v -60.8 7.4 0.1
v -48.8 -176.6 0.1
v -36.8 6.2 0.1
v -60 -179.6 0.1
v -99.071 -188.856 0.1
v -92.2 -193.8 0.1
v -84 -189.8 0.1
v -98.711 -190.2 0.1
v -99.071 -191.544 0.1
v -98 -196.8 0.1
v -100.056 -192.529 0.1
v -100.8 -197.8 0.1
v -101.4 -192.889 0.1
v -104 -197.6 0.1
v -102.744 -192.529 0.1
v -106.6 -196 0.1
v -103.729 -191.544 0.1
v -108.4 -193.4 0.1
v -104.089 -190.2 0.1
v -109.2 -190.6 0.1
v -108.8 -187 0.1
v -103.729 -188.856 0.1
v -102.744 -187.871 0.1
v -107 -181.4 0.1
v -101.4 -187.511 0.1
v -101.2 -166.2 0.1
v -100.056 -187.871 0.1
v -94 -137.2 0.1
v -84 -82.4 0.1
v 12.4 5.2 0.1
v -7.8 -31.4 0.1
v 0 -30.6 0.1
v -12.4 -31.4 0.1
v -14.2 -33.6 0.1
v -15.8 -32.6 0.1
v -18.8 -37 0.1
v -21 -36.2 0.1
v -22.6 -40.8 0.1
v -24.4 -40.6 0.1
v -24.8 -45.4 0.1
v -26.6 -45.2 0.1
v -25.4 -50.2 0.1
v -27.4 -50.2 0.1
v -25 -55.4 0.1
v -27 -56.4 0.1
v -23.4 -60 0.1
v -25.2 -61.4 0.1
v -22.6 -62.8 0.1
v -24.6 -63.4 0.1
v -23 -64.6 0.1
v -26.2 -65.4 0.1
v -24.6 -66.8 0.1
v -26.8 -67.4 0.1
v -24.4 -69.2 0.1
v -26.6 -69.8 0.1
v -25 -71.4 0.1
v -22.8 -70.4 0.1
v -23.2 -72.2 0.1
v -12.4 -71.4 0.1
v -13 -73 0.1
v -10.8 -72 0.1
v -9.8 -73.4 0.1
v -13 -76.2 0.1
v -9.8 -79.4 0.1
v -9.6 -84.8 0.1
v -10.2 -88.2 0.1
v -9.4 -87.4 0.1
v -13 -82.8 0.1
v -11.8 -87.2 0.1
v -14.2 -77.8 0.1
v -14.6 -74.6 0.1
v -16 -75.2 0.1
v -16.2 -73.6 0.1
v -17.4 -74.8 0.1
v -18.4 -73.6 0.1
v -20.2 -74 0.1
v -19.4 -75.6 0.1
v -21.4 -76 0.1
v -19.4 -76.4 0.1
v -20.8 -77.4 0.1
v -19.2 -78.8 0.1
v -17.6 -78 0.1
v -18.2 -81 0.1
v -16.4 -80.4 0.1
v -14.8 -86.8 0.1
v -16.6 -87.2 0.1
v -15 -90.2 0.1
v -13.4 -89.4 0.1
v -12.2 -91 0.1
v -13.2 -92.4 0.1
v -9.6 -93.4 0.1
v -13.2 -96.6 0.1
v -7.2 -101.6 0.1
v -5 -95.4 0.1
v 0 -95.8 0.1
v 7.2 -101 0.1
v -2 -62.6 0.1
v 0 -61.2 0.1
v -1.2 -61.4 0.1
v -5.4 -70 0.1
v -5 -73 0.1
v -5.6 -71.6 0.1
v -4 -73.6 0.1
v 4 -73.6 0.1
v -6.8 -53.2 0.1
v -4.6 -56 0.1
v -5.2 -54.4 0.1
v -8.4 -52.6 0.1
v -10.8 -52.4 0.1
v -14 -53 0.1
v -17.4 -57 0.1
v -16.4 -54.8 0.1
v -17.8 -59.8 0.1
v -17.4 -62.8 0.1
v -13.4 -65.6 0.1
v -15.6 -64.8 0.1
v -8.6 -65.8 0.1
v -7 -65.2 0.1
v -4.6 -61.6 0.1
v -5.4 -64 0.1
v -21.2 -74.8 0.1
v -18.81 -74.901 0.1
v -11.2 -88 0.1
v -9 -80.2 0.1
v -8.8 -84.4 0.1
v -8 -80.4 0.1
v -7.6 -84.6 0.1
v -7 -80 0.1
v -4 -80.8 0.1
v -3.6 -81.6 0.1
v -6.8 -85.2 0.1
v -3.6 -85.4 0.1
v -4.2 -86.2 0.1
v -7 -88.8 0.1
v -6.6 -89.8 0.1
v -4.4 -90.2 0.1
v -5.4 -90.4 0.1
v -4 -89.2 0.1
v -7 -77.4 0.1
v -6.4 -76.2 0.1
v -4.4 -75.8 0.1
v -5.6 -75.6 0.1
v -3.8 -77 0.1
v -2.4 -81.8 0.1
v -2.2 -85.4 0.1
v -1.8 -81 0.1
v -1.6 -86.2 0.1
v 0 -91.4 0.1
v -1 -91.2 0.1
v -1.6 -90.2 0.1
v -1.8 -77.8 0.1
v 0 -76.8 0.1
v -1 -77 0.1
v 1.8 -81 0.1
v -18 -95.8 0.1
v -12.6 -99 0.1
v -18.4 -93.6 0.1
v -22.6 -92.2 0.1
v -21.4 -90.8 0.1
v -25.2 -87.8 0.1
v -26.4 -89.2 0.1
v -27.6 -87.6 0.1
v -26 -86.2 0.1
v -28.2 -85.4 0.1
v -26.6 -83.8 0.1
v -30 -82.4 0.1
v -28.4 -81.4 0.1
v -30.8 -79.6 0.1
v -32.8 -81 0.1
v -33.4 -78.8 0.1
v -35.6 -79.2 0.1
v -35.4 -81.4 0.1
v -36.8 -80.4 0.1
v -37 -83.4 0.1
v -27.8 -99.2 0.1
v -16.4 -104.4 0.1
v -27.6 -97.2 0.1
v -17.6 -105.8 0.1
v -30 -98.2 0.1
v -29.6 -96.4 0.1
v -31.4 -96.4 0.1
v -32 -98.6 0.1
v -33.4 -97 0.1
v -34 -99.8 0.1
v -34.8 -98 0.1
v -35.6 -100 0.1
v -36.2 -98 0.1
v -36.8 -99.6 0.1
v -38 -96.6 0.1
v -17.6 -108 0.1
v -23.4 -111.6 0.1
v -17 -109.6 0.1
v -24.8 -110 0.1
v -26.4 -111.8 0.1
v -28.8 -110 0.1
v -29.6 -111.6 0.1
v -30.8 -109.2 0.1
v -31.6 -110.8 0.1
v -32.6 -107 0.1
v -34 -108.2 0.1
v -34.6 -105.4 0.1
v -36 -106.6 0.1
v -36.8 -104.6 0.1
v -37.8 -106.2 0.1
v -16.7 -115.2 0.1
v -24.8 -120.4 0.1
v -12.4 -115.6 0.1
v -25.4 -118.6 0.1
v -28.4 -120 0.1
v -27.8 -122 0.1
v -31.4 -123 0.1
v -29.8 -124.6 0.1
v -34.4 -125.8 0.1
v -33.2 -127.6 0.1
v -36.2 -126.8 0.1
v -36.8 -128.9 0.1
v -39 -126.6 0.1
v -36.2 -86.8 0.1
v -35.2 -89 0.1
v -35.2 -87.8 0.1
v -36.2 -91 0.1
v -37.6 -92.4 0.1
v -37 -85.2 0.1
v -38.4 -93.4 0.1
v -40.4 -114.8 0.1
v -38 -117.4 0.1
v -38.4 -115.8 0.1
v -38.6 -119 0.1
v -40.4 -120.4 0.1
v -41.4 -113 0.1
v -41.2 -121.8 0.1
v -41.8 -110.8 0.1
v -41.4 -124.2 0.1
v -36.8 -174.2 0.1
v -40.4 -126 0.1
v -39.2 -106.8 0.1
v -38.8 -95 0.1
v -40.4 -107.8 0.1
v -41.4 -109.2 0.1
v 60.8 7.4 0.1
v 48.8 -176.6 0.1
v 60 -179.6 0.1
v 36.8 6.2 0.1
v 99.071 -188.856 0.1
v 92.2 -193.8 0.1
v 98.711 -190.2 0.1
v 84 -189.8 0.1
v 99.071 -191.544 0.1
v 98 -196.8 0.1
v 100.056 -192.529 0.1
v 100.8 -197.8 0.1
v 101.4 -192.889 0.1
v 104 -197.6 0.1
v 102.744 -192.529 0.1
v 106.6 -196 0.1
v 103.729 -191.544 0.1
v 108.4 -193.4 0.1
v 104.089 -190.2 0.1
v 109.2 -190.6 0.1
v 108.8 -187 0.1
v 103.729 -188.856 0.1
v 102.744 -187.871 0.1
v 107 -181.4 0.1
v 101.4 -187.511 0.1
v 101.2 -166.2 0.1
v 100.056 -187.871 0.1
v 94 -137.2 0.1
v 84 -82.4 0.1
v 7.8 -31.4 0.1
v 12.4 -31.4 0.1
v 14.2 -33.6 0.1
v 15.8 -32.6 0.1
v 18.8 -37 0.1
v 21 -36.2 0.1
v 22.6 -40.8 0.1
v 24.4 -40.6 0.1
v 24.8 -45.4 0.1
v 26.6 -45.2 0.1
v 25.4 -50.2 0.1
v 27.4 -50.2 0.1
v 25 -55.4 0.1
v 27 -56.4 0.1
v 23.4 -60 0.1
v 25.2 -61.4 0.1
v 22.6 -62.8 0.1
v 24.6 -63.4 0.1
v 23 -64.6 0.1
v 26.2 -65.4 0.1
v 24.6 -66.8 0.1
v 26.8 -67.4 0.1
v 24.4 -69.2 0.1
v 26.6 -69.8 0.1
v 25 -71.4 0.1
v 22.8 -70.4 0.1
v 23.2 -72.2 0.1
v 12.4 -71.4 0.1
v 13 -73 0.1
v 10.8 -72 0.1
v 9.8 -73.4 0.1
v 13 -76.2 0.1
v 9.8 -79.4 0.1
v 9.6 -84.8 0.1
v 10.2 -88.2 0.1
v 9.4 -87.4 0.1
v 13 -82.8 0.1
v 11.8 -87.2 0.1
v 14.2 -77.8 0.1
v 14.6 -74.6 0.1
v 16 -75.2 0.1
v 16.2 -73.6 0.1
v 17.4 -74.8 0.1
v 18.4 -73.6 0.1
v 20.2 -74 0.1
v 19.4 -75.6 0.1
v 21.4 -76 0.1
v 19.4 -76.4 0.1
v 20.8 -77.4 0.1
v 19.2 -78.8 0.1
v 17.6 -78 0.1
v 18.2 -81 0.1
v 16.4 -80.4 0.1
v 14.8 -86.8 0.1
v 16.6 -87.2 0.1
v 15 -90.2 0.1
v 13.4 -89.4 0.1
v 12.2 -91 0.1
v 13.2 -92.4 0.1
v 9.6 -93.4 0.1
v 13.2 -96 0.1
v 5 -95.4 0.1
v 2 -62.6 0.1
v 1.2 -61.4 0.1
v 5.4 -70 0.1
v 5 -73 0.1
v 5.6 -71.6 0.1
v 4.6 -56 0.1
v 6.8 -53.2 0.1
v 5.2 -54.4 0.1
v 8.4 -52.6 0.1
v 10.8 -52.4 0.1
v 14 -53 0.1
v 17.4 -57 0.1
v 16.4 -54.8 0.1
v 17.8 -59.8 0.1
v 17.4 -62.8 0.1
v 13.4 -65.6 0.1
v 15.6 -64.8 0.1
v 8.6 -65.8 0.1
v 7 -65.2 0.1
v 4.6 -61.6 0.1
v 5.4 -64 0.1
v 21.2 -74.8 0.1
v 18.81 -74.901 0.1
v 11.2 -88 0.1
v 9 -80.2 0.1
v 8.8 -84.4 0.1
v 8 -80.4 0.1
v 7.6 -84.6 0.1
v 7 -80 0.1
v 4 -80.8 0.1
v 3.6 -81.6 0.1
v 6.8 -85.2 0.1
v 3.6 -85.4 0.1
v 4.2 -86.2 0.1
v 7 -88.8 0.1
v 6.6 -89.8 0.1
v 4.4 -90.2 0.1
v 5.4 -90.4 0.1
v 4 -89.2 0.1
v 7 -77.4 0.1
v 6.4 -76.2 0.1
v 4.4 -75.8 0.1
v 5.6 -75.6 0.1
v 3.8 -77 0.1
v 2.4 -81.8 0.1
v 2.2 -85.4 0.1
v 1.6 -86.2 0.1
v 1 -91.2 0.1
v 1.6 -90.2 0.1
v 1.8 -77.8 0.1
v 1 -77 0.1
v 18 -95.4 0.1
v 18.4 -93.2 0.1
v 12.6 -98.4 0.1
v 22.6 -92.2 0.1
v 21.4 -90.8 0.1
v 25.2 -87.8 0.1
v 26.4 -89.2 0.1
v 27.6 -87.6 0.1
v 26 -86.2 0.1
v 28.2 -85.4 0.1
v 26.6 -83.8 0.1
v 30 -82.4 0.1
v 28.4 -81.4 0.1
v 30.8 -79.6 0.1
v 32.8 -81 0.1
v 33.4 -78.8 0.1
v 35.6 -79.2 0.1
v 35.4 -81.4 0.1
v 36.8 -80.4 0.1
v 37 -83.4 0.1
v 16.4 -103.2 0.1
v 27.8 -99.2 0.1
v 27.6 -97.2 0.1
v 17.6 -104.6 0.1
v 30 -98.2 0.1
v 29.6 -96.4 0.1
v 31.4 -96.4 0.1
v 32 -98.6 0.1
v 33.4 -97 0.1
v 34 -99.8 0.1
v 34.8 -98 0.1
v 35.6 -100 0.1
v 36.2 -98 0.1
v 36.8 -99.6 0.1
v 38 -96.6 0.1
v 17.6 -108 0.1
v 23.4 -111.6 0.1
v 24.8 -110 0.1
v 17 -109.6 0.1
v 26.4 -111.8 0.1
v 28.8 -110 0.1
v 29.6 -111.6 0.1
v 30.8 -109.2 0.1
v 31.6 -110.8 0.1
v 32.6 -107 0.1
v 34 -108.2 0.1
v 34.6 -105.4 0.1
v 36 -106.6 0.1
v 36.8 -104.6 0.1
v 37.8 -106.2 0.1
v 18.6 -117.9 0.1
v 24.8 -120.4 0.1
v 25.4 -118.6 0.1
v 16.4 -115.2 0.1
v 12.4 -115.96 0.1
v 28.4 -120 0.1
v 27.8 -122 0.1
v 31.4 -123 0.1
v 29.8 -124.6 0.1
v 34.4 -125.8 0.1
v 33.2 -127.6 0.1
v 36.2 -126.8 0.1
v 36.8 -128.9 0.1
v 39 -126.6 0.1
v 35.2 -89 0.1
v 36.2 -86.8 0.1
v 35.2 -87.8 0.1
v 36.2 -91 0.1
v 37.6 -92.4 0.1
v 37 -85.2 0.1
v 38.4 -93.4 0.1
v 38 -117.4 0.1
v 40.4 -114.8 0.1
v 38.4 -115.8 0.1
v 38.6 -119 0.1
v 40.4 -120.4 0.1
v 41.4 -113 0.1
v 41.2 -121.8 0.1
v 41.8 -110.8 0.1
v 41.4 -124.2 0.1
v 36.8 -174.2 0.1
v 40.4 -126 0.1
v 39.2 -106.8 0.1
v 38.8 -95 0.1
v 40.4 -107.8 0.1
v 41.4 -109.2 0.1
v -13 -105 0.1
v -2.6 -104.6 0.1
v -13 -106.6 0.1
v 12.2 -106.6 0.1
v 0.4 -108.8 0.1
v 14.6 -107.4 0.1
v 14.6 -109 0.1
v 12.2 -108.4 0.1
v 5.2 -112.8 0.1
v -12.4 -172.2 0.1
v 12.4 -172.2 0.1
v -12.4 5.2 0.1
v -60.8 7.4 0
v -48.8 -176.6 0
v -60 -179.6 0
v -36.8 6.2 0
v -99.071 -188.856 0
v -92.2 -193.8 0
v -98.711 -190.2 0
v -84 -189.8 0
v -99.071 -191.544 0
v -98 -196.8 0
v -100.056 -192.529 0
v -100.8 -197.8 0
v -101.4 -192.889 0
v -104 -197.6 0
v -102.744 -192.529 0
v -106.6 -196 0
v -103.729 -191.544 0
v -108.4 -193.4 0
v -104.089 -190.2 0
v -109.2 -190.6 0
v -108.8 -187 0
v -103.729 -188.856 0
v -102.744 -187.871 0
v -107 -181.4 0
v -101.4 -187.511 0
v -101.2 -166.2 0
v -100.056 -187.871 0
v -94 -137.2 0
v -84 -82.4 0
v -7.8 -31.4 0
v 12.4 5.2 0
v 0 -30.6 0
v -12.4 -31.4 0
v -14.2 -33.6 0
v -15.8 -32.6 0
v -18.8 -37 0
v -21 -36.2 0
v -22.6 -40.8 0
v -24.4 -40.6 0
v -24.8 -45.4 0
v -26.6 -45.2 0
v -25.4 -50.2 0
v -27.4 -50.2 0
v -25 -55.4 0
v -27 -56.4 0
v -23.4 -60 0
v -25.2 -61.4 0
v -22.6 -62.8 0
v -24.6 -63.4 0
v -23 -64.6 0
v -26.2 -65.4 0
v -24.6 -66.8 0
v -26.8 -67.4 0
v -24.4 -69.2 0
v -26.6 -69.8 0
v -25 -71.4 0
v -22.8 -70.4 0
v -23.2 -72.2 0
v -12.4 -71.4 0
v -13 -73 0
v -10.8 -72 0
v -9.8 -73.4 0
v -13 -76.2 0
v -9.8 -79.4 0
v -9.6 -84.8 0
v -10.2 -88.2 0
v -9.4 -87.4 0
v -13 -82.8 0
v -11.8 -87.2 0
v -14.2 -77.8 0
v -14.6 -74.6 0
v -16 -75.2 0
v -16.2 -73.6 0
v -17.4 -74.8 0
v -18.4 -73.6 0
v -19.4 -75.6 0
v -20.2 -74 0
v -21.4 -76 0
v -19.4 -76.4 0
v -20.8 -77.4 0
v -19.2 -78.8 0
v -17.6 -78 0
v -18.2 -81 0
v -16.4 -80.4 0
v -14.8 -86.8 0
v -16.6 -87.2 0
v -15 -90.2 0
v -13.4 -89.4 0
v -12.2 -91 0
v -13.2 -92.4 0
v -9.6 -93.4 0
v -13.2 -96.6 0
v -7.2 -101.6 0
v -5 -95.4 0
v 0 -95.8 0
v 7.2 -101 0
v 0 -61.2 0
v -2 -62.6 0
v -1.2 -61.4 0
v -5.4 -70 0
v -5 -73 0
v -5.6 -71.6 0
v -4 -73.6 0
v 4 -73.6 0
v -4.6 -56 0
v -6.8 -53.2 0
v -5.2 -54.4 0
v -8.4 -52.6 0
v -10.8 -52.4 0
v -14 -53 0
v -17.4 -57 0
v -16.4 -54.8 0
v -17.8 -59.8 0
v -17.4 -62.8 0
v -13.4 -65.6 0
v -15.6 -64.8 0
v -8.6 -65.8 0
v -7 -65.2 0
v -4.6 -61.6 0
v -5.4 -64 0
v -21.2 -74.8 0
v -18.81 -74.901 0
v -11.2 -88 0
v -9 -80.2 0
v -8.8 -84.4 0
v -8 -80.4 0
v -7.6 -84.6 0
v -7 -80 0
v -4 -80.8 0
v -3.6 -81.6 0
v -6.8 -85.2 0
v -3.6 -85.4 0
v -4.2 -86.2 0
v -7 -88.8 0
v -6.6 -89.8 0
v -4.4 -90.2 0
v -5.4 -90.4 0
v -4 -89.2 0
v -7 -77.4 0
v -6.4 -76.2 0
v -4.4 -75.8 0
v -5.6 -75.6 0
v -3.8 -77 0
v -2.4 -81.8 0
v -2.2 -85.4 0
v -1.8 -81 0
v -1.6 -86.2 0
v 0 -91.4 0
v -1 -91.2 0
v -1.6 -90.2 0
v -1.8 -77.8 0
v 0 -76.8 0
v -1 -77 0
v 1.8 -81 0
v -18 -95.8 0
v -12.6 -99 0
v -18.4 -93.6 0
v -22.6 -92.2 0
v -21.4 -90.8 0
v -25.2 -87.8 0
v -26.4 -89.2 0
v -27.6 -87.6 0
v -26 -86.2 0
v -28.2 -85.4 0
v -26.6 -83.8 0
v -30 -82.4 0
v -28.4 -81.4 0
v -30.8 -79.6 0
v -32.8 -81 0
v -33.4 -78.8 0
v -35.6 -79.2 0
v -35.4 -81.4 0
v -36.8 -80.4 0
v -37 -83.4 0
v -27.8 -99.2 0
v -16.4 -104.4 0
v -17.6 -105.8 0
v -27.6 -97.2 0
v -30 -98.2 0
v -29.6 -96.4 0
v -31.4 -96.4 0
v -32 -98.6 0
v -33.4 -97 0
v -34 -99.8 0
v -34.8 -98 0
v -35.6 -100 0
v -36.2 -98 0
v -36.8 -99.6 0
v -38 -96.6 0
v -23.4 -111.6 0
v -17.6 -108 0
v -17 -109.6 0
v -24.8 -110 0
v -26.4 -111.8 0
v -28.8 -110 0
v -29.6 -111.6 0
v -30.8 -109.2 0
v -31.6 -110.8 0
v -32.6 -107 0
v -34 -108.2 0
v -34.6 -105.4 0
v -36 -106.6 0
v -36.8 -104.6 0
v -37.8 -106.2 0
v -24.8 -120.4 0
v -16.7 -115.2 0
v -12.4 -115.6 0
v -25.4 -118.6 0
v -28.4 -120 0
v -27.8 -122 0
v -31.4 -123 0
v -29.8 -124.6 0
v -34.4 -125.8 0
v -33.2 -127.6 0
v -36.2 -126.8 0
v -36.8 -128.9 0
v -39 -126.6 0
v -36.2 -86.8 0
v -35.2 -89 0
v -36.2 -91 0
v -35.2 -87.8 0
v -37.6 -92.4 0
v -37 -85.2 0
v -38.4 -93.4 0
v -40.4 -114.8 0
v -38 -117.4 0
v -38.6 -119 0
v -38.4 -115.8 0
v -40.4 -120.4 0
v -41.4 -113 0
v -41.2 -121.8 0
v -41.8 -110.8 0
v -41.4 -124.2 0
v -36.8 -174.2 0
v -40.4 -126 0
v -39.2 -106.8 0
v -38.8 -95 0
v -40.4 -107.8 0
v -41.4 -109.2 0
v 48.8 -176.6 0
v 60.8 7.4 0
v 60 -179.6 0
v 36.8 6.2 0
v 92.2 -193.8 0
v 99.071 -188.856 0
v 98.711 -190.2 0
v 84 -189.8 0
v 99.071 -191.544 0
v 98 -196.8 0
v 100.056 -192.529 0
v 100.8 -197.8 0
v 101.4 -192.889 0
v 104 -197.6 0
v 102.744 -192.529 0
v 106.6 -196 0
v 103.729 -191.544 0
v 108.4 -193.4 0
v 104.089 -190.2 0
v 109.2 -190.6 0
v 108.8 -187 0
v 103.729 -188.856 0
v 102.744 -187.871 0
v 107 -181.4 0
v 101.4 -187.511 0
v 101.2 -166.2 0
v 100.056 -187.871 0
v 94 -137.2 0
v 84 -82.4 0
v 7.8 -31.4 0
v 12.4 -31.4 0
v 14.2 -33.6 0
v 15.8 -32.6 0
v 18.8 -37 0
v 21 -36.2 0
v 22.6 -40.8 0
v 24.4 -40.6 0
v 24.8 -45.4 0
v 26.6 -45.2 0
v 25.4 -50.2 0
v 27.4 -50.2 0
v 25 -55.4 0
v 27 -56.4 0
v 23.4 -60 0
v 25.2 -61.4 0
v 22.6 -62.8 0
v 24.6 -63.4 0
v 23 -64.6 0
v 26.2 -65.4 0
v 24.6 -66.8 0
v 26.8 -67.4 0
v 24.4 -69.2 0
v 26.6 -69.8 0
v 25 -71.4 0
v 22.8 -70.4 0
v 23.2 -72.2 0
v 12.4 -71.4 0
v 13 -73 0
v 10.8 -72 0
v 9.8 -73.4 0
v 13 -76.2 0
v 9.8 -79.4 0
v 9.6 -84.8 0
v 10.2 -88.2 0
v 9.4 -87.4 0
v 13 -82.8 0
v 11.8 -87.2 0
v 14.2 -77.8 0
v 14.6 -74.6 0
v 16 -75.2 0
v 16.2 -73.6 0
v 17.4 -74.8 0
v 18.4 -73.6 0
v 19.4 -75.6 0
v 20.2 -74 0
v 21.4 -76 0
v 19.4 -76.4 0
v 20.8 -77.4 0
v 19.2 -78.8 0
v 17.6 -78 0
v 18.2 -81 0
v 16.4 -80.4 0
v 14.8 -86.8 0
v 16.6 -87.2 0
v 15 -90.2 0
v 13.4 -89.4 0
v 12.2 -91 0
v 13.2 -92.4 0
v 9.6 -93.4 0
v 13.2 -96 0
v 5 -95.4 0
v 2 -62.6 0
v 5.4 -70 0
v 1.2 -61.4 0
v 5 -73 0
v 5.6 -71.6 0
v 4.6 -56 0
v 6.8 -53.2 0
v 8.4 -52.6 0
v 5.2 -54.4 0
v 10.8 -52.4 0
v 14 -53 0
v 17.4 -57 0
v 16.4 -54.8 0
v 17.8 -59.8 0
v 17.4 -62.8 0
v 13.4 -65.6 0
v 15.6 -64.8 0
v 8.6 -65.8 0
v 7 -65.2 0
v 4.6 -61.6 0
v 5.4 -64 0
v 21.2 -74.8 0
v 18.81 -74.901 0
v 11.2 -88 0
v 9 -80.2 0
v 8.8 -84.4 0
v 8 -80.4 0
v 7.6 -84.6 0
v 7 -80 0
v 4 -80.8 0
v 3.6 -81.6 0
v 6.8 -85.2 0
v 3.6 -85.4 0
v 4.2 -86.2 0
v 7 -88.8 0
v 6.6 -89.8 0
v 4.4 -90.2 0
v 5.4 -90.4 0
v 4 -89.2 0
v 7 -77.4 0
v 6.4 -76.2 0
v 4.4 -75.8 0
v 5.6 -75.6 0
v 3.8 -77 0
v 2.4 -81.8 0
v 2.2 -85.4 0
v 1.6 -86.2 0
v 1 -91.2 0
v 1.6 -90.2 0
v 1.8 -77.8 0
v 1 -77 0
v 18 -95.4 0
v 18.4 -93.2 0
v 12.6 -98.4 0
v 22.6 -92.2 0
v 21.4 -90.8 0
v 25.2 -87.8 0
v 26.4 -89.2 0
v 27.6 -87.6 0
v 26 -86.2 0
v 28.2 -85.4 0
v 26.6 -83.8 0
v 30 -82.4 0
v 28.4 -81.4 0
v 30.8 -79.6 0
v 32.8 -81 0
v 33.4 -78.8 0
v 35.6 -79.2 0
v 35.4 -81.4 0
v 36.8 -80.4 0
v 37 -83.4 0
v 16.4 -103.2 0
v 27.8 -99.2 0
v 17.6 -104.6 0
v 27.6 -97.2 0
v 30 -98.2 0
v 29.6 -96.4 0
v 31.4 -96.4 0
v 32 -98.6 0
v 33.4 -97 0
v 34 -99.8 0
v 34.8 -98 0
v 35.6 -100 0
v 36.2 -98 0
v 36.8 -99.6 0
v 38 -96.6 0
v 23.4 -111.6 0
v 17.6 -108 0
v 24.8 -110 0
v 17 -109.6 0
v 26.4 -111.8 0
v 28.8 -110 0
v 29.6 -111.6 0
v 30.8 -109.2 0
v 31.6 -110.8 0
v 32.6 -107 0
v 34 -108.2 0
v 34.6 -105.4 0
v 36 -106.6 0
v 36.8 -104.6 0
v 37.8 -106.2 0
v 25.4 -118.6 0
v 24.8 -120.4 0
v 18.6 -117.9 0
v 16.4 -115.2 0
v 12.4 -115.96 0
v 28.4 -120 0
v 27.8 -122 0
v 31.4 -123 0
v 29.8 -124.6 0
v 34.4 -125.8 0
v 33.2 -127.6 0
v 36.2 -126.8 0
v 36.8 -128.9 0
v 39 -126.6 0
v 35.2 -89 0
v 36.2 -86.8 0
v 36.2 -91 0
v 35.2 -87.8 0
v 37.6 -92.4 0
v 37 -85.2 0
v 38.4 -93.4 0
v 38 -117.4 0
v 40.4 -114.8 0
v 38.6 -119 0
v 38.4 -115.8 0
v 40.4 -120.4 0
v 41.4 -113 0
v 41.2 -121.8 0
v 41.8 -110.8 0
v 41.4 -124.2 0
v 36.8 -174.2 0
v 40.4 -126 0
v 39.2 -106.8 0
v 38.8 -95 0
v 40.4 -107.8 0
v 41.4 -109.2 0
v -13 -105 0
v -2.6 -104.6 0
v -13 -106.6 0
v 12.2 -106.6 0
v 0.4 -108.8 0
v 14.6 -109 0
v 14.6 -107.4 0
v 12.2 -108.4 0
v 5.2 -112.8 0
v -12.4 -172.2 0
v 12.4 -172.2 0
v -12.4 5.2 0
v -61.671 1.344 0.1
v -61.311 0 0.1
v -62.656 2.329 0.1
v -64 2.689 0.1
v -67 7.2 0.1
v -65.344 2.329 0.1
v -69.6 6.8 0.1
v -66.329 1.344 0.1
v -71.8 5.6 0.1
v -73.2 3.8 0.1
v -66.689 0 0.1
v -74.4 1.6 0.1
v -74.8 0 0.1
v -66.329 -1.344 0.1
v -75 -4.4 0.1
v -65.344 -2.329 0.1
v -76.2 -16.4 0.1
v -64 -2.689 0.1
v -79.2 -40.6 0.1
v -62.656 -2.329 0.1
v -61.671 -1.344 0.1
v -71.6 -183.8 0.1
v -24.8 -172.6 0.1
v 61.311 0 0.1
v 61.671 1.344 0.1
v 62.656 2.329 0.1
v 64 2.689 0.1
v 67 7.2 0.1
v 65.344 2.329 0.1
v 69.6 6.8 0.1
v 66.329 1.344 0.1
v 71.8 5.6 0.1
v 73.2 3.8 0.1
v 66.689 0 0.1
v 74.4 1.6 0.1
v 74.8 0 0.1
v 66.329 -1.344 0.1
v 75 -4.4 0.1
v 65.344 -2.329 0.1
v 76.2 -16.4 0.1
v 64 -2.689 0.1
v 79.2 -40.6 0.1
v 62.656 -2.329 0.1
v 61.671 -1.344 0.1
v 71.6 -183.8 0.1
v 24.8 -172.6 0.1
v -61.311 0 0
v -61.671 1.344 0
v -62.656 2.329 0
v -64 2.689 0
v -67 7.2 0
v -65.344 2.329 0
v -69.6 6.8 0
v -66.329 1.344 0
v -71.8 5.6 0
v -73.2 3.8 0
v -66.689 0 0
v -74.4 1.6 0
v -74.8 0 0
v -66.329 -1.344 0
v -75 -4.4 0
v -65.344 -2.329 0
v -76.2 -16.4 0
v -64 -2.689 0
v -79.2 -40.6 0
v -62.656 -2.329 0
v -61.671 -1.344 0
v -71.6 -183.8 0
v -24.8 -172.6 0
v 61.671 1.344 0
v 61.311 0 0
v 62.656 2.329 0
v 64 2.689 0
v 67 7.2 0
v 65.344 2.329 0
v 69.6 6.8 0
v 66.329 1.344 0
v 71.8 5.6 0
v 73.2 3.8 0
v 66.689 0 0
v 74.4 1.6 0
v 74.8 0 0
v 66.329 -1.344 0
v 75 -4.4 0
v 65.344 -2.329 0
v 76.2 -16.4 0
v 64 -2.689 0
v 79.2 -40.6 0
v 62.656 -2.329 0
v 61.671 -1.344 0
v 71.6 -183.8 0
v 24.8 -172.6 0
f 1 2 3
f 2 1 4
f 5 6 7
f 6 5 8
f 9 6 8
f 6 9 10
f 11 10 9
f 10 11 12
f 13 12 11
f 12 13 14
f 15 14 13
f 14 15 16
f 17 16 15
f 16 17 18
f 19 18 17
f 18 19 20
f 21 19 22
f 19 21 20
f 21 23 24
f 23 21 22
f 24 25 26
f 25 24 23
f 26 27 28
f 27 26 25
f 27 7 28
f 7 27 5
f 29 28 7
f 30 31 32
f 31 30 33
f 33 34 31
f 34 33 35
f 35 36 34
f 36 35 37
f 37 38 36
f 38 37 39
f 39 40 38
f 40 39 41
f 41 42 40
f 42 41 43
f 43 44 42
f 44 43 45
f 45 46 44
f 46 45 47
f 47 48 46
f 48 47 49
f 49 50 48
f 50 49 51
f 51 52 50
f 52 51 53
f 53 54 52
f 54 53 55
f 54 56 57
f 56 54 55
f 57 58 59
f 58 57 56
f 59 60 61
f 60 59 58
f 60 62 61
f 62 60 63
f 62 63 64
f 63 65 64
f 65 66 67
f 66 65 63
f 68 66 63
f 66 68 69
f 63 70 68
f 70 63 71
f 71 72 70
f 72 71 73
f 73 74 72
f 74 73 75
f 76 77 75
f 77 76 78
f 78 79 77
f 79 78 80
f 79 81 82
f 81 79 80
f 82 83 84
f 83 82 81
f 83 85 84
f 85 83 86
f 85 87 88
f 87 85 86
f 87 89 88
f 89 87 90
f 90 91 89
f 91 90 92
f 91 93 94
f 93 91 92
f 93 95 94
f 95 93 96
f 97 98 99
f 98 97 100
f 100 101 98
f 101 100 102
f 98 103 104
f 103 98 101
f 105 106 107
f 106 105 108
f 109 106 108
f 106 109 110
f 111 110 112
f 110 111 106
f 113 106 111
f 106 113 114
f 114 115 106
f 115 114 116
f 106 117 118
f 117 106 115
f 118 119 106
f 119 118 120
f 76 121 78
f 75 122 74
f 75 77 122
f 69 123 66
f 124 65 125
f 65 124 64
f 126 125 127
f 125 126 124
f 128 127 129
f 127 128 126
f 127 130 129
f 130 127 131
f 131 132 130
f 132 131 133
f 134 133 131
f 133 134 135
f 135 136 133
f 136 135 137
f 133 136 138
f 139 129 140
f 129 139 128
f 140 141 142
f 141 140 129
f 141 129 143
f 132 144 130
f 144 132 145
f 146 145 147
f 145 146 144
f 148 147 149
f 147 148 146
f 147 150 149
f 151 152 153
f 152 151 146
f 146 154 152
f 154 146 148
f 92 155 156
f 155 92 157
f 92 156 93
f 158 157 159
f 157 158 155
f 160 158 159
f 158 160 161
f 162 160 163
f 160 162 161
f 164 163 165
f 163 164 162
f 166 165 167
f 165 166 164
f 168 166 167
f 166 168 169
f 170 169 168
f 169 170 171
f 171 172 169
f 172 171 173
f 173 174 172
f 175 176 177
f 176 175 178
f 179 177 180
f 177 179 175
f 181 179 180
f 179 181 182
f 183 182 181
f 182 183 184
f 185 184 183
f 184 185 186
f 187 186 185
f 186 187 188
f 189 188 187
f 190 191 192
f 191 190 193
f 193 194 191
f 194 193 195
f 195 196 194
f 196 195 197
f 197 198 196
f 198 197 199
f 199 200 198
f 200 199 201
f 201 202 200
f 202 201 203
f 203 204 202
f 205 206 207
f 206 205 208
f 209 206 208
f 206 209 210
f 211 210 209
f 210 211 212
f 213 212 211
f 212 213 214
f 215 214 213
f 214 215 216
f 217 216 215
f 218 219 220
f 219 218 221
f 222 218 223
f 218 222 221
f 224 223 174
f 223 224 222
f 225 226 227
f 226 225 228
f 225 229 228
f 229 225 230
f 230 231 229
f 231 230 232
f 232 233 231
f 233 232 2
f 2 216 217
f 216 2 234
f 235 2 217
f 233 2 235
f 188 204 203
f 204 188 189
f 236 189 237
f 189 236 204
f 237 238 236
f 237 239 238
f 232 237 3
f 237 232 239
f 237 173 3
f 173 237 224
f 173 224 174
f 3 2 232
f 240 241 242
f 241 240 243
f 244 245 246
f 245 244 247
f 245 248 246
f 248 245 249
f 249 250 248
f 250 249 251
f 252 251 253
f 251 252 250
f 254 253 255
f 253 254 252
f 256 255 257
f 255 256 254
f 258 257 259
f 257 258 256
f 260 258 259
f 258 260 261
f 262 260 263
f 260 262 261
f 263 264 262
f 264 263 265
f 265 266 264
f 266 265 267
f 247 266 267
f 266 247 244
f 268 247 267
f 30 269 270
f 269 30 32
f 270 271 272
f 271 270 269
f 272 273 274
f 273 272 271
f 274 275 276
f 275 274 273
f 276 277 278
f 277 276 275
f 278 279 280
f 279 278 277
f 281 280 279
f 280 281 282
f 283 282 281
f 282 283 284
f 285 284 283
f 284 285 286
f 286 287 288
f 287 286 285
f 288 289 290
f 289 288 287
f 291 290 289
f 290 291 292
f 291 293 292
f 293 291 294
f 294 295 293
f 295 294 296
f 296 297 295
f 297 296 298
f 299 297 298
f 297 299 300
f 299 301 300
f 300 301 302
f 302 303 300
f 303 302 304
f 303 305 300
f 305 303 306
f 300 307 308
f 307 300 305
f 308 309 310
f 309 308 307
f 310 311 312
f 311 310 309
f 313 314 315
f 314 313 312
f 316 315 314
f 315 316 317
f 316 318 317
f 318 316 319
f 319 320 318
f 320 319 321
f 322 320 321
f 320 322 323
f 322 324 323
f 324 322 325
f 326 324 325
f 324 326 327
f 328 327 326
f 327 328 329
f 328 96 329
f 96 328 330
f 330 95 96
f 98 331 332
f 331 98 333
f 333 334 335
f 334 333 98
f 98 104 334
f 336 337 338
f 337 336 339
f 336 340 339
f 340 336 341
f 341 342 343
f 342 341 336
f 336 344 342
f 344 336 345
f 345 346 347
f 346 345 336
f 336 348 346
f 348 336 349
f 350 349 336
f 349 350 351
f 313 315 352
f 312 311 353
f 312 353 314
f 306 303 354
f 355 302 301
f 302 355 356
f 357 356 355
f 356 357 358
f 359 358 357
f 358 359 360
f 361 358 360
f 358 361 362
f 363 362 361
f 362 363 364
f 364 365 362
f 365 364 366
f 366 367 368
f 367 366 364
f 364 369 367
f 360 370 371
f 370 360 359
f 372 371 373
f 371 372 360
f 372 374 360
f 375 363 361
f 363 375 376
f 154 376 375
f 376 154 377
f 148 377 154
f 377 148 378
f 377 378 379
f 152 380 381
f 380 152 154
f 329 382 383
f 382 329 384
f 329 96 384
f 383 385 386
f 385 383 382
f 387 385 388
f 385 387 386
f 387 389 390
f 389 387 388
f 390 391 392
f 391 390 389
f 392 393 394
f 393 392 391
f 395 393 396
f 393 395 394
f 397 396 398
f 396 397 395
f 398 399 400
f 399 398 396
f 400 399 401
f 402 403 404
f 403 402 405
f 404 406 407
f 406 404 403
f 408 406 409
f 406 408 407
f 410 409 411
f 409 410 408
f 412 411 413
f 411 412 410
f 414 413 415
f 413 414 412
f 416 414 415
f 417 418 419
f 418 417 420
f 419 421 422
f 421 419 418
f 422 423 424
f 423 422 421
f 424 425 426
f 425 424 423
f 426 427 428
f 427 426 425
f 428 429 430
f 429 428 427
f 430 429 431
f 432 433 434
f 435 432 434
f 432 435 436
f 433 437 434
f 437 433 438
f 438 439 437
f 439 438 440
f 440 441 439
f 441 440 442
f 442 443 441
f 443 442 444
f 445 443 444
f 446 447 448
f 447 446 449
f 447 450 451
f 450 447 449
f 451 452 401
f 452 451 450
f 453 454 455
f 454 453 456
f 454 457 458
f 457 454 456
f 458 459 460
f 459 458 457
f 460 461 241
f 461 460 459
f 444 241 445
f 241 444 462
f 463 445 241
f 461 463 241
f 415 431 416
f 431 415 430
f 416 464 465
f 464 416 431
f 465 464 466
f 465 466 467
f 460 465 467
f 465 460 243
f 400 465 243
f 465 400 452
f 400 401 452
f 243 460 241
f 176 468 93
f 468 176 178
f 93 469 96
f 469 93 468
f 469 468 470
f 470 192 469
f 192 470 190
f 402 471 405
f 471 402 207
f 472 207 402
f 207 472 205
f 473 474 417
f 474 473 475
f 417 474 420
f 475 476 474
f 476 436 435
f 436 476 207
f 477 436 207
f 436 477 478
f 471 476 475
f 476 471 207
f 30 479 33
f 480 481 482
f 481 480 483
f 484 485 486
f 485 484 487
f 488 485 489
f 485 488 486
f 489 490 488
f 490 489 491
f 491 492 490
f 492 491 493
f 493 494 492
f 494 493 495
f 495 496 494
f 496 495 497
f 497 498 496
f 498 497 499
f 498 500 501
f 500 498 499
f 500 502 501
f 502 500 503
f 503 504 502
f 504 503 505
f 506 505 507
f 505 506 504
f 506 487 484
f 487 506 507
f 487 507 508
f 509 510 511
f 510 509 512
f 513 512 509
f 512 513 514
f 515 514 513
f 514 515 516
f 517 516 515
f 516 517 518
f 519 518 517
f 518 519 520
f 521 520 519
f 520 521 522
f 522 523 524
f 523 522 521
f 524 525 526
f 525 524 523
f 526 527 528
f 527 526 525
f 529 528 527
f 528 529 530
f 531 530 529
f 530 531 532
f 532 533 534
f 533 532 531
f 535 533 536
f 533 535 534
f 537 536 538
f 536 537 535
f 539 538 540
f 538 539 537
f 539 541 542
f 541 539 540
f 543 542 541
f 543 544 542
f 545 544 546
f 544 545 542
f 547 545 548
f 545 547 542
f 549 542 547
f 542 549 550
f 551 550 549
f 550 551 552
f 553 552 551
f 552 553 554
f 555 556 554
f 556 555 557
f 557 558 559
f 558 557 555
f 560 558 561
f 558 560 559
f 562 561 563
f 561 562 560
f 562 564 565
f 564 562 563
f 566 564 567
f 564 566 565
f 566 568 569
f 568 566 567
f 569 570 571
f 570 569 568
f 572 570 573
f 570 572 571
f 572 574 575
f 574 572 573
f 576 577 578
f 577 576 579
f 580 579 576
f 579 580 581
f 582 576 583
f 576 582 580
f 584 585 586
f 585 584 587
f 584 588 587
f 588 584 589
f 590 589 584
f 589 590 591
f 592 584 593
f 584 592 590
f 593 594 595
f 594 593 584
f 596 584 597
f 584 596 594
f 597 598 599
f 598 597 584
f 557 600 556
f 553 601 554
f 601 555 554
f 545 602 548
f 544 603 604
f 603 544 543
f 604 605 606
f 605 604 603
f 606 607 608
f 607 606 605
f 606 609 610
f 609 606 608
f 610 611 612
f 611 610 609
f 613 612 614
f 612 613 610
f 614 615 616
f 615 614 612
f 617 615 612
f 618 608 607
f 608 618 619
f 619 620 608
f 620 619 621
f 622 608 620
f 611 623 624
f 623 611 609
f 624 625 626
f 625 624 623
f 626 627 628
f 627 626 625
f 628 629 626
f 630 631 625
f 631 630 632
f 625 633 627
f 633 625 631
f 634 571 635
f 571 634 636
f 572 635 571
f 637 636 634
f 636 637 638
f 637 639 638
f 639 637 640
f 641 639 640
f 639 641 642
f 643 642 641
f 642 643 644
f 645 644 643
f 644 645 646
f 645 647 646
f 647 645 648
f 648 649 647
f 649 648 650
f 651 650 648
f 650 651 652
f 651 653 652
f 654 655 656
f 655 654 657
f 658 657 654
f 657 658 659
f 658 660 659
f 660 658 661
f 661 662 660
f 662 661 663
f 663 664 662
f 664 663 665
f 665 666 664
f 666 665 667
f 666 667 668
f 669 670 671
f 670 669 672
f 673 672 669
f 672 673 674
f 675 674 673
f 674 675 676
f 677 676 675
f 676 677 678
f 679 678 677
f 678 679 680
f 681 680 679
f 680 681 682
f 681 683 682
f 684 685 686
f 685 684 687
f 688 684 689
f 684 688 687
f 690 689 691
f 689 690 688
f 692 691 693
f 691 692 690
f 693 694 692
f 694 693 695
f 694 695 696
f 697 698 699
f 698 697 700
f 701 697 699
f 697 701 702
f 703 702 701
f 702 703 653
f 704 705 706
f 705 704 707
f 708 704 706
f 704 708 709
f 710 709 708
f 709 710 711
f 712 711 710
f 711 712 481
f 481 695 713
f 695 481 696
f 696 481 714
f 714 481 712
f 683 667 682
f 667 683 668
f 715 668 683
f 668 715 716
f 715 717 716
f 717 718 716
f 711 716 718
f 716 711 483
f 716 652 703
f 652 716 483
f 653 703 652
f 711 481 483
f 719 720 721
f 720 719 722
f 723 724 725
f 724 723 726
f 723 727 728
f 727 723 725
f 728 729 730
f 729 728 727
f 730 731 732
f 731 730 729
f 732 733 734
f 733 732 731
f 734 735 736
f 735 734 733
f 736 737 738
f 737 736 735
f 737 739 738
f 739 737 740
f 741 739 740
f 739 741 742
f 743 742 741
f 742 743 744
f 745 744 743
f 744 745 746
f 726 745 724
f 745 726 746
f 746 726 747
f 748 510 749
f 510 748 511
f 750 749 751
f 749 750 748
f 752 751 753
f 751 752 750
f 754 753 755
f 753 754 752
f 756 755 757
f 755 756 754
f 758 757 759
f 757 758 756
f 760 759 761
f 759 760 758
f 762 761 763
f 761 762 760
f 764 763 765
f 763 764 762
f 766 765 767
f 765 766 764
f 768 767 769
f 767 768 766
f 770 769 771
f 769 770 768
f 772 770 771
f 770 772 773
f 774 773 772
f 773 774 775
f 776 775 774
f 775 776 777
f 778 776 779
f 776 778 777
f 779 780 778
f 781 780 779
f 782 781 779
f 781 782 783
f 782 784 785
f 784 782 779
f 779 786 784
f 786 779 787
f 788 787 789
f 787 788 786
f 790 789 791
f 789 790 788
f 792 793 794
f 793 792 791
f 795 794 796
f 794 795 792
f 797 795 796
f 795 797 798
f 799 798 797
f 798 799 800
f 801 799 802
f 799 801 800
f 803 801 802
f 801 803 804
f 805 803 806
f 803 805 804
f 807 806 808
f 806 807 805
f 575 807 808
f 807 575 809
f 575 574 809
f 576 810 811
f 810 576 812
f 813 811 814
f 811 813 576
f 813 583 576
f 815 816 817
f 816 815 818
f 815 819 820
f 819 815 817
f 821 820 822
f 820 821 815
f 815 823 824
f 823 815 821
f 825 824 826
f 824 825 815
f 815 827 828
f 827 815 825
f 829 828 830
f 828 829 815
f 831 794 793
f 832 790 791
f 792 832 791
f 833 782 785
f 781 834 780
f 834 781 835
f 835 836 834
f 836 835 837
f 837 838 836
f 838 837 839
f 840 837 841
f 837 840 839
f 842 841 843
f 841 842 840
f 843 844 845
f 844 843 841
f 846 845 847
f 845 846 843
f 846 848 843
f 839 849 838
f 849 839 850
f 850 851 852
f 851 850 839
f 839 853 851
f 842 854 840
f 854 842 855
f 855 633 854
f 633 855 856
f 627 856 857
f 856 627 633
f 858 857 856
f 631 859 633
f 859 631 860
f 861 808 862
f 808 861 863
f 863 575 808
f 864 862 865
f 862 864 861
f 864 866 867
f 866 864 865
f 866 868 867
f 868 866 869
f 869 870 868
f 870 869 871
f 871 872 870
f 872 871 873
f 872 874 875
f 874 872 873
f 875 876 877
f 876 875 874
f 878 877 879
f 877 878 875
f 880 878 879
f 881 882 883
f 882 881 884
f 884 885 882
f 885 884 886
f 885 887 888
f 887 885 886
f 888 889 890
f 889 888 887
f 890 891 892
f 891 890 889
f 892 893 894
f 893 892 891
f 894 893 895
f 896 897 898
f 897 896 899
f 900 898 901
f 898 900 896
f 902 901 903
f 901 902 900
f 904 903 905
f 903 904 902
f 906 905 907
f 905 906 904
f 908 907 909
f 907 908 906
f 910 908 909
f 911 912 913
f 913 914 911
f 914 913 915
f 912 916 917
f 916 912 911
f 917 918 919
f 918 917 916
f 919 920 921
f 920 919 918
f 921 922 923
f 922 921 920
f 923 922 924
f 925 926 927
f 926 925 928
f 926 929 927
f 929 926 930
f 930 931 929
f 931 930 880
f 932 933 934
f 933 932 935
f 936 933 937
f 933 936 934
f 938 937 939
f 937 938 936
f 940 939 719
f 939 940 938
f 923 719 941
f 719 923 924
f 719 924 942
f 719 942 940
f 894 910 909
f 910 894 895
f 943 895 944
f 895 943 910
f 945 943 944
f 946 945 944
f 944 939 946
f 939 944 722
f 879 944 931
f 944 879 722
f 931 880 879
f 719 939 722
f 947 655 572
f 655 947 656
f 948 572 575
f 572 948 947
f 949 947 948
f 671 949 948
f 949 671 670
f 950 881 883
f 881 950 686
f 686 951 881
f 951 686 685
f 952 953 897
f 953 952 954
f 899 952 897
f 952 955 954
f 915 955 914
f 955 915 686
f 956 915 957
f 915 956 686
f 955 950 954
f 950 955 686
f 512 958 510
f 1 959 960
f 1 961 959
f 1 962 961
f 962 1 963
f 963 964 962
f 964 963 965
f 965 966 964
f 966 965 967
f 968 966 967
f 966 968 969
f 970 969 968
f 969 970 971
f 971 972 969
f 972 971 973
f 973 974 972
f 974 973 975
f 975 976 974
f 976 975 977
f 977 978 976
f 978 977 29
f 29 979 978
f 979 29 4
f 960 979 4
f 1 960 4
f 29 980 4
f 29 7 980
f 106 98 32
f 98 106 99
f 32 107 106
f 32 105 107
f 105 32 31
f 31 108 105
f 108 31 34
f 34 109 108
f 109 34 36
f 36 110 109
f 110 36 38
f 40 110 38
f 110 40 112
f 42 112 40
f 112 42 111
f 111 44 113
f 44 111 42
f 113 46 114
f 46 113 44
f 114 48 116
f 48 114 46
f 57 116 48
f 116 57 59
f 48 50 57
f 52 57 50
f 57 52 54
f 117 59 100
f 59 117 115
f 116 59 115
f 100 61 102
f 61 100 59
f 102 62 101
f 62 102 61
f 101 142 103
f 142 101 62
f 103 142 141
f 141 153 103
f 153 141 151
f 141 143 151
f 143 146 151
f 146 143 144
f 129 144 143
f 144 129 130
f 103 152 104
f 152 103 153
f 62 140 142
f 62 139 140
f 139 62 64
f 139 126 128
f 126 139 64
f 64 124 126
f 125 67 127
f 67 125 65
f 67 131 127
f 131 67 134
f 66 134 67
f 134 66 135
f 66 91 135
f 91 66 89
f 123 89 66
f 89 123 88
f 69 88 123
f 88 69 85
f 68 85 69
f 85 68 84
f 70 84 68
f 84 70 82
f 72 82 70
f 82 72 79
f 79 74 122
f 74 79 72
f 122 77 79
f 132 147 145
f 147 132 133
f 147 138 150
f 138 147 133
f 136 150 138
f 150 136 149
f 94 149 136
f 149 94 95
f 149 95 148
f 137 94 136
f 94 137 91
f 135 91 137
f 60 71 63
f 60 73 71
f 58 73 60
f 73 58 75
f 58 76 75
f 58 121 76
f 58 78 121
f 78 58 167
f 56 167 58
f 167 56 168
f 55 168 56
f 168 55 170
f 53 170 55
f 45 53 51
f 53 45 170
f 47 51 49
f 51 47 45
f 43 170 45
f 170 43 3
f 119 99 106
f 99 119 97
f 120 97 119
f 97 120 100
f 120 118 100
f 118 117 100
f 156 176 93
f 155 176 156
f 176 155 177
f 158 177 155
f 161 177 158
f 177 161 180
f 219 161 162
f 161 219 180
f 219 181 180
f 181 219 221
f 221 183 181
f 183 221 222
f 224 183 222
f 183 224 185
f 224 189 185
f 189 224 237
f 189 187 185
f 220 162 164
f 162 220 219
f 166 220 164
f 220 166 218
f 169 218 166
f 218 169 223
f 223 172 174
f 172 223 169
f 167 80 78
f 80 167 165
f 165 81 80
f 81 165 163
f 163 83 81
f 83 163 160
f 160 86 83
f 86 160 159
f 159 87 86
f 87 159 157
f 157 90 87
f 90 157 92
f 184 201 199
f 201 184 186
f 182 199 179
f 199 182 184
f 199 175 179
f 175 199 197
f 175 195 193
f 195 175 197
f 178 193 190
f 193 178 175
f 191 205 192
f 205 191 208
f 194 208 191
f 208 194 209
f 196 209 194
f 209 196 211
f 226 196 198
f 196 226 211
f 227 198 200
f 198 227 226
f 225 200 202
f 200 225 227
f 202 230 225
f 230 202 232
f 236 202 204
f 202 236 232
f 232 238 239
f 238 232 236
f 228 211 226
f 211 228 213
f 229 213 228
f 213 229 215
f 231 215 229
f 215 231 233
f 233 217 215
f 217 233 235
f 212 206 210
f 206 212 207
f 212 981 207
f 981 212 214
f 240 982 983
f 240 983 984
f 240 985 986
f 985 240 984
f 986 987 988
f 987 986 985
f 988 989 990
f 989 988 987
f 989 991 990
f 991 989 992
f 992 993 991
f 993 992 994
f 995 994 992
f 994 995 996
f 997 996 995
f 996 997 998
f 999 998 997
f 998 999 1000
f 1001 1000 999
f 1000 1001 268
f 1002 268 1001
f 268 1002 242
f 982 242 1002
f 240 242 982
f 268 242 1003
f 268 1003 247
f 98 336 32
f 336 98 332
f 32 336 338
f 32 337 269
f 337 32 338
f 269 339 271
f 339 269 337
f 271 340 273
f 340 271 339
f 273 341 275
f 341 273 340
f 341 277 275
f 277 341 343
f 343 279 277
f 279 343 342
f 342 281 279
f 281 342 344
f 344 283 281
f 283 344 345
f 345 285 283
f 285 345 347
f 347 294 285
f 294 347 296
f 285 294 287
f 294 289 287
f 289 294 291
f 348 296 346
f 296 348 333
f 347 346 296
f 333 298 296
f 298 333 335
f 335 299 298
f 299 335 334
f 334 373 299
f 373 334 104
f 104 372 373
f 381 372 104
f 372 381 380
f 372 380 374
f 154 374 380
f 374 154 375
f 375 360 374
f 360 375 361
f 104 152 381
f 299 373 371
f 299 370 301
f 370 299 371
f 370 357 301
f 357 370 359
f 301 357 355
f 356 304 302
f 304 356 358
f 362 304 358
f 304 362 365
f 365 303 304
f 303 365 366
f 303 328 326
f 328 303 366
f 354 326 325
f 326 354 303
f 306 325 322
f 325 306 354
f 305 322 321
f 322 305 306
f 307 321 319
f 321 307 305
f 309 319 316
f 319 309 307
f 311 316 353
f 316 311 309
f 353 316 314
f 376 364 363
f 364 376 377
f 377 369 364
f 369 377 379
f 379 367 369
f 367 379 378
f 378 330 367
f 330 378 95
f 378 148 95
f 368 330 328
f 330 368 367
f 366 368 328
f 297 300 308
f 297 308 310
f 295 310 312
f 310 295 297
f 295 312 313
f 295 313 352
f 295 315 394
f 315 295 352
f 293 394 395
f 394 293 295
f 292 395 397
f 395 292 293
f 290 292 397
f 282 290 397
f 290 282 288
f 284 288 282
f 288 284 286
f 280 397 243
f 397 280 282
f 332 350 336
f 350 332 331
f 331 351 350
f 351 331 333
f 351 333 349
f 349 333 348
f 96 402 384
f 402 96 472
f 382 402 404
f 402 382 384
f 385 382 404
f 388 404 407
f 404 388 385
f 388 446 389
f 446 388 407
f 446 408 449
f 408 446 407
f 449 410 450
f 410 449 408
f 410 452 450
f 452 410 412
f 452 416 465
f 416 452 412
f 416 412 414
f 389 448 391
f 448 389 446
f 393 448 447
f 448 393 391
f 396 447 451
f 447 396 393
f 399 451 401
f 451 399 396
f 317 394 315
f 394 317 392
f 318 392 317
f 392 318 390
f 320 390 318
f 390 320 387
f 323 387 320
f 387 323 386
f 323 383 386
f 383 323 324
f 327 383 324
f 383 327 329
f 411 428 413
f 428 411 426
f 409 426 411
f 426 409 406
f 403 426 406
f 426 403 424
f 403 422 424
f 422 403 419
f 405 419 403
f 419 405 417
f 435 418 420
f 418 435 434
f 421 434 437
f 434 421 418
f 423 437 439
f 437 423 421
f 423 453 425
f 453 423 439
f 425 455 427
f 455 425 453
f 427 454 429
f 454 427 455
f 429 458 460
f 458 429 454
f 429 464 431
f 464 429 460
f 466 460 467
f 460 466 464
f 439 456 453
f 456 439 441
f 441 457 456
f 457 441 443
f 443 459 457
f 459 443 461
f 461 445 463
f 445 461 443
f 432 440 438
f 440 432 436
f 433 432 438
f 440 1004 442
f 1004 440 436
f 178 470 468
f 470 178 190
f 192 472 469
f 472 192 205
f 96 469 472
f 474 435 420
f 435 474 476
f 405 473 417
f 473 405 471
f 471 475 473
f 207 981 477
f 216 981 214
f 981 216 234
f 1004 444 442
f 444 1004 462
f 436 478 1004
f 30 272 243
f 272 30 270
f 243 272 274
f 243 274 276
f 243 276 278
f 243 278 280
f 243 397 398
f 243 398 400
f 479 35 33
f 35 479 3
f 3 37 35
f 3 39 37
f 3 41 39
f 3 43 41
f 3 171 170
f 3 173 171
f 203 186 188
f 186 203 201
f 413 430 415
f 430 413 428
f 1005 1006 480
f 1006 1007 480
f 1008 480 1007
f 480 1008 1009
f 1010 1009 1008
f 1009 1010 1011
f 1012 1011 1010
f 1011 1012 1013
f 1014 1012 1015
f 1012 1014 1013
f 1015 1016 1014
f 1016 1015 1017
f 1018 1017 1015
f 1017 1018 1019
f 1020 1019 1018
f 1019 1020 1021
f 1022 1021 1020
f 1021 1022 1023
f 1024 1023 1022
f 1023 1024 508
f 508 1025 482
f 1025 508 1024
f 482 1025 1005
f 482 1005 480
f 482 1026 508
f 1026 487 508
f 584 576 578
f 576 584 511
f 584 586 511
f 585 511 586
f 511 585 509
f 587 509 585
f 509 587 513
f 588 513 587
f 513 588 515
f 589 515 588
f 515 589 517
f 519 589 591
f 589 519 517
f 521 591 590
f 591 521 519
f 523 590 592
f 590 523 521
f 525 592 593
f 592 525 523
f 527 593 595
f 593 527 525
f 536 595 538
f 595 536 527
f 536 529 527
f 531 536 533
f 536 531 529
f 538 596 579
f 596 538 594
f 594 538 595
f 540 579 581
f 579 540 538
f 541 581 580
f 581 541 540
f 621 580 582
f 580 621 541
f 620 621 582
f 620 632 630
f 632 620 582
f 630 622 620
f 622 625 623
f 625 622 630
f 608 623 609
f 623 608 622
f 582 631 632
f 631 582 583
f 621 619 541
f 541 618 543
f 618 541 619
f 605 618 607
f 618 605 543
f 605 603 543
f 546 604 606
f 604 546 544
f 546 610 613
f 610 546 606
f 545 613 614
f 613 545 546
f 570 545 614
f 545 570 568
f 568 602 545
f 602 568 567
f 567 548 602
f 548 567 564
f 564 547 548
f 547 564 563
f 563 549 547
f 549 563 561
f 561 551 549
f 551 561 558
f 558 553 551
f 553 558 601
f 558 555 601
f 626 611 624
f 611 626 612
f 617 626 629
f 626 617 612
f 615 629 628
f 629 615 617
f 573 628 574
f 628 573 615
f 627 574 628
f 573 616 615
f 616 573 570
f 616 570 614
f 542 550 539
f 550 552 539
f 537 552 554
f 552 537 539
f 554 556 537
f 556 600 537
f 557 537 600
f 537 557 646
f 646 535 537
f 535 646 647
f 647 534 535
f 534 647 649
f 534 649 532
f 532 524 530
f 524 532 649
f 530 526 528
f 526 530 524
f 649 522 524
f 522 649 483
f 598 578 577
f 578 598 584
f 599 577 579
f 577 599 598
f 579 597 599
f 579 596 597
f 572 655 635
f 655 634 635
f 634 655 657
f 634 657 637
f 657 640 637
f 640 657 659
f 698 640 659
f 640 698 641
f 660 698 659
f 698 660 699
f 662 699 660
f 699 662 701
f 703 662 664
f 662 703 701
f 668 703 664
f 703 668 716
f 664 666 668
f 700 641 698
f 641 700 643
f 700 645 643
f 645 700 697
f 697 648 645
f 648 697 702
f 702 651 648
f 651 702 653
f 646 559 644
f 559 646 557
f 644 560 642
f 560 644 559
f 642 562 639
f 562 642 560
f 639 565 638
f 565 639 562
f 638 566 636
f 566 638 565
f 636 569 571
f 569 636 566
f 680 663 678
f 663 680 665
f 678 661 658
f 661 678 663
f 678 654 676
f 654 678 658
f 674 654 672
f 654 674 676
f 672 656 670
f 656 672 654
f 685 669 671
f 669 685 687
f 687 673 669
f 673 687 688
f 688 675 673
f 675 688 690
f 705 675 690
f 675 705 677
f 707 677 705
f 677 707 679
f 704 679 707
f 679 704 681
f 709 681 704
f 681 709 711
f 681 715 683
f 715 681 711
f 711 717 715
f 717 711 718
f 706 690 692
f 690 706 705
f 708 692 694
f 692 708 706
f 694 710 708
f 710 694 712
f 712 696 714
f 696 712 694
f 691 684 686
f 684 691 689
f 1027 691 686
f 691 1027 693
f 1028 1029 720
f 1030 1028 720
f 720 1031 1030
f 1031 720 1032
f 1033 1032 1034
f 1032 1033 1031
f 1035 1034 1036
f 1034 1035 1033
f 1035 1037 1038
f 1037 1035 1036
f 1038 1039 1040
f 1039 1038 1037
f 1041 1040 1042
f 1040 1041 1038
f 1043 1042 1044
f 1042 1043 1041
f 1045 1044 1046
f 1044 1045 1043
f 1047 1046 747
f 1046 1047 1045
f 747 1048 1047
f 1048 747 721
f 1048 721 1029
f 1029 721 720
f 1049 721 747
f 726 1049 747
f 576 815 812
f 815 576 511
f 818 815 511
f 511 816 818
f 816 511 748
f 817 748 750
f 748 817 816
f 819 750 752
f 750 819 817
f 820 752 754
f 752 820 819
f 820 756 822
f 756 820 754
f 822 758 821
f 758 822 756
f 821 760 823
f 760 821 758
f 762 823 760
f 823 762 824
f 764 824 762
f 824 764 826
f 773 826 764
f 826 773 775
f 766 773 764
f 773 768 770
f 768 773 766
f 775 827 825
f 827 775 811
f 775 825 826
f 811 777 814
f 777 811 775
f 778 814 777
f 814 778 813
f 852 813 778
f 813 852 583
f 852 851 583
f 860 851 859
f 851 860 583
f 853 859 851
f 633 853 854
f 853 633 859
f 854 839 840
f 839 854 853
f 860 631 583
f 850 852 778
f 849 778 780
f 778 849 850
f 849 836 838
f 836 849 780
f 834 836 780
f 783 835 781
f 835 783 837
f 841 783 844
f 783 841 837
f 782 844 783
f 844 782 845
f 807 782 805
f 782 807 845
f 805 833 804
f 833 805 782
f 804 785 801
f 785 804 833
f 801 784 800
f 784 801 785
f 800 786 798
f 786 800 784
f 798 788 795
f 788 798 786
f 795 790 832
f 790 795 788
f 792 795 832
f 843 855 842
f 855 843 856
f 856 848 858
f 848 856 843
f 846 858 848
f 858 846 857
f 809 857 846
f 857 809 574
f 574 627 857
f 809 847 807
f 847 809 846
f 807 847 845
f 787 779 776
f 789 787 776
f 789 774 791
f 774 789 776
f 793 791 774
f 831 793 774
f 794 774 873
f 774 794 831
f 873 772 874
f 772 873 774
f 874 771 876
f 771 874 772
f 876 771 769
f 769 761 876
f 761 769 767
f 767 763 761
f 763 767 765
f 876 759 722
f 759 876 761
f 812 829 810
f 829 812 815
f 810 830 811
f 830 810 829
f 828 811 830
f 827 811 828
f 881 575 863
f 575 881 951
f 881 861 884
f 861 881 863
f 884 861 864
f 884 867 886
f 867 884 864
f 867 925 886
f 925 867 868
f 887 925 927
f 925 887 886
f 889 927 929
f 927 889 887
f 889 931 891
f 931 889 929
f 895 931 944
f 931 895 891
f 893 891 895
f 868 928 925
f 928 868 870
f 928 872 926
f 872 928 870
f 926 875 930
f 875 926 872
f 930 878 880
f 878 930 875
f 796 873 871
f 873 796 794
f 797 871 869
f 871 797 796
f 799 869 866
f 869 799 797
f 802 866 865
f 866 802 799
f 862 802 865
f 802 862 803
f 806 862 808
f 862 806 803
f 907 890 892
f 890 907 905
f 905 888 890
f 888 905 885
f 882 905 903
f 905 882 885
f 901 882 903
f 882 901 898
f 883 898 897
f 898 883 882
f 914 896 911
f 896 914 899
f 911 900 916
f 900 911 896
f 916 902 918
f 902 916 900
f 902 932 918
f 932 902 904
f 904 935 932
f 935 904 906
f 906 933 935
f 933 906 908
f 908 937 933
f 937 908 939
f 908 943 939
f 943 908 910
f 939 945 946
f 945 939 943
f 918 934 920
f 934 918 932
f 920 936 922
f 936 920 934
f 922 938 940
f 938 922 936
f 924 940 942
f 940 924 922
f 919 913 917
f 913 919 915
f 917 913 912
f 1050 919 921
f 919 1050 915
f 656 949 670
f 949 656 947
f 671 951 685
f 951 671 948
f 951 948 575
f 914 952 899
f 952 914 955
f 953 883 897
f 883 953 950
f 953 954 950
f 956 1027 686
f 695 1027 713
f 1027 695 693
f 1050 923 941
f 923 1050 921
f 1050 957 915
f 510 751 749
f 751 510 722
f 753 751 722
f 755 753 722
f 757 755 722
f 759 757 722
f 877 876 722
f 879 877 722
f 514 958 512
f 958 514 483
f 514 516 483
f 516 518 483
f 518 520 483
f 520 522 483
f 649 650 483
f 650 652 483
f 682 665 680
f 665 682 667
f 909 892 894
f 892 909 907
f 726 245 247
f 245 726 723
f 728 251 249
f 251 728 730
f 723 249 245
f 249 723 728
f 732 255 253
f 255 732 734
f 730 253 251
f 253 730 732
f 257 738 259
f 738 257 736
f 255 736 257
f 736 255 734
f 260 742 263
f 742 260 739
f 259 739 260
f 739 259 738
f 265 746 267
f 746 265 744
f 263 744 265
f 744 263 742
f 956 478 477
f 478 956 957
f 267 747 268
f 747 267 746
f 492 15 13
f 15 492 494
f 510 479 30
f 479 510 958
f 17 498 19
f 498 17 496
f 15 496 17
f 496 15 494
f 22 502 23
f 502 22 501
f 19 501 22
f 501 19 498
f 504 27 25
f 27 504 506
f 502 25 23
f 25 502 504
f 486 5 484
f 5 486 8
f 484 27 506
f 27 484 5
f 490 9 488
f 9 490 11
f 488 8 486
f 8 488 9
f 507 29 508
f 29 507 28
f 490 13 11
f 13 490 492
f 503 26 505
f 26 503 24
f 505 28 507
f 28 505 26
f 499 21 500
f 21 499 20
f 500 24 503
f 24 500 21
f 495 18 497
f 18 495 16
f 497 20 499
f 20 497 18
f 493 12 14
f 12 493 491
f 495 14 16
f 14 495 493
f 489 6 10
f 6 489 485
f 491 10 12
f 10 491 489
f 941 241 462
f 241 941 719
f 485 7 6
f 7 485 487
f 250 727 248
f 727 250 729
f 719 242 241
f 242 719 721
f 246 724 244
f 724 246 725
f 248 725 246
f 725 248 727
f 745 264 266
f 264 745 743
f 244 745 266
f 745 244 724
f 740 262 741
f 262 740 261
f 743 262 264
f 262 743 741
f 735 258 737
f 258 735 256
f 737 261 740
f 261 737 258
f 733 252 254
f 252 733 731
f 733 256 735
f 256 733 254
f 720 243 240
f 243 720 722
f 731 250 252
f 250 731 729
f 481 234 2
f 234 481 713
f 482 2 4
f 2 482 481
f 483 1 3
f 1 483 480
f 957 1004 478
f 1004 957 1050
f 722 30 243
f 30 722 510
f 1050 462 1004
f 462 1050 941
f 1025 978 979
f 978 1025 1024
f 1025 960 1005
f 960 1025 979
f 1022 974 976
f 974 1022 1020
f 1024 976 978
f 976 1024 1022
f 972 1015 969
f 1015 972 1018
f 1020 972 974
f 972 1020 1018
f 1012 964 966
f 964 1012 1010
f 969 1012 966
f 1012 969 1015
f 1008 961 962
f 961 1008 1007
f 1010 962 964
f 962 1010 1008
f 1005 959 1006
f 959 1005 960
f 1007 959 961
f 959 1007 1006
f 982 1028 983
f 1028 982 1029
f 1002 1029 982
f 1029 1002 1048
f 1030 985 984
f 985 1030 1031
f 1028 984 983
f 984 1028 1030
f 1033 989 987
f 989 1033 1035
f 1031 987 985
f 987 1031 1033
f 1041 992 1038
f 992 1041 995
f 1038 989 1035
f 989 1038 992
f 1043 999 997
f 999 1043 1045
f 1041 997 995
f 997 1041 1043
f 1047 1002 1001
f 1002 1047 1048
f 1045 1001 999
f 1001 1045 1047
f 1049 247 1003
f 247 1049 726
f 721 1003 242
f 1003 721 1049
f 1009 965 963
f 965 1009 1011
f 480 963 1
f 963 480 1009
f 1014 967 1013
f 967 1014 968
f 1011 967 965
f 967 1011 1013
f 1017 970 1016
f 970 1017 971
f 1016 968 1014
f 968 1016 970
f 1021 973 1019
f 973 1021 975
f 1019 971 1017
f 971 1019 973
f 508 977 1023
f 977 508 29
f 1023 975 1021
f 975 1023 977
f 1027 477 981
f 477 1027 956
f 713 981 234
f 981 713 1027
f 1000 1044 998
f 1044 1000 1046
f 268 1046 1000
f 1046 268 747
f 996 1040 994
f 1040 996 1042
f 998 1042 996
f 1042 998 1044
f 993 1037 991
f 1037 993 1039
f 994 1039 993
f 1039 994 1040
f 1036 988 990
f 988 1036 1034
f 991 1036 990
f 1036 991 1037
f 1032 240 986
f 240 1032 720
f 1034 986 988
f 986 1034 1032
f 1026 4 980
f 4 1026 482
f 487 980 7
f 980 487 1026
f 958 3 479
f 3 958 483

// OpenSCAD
use <../lib.scad>
use <s/u9499s01.scad>
use <s/u9499s02.scad>
use <s/u9499s03.scad>
use <s/u9499s04.scad>
function ldraw_lib__u9499p01() = [
// 0 Sheet Fabric 25 x 25 Square Sail with Thick Stripes Skull and Crossed Bones on White Background Pattern
// 0 Name: u9499p01.dat
// 0 Author: Philippe Hurbain [Philo]
// 0 !LDRAW_ORG Part UPDATE 2022-03
// 0 !LICENSE Licensed under CC BY 2.0 and CC BY 4.0 : see CAreadme.txt
// 
// 0 BFC CERTIFY CCW
  [0,"BFC","CERTIFY"],
  [0,"BFC","CCW"],
// 
// 0 !CATEGORY Sheet Fabric
// 0 !KEYWORDS set 6286, Skull's Eye Schooner
// 
// 0 !HISTORY 2022-05-07 [PTadmin] Official Update 2022-03
// 
// 
// 1 16 0 -0.25 0 1 0 0 0 1 0 0 0 1 s\u9499s01.dat
  [1,16,0,-0.25,0,1,0,0,0,1,0,0,0,1, ldraw_lib__s__u9499s01()],
// 1 16 0 0 0 1 0 0 0 -1 0 0 0 1 s\u9499s01.dat
  [1,16,0,0,0,1,0,0,0,-1,0,0,0,1, ldraw_lib__s__u9499s01()],
// 
// 1 15 0 -0.25 0 1 0 0 0 1 0 0 0 1 s\u9499s02.dat
  [1,15,0,-0.25,0,1,0,0,0,1,0,0,0,1, ldraw_lib__s__u9499s02()],
// 1 15 0 0 0 1 0 0 0 -1 0 0 0 1 s\u9499s02.dat
  [1,15,0,0,0,1,0,0,0,-1,0,0,0,1, ldraw_lib__s__u9499s02()],
// 
// 1 16 0 0 0 1 0 0 0 1 0 0 0 1 s\u9499s03.dat
  [1,16,0,0,0,1,0,0,0,1,0,0,0,1, ldraw_lib__s__u9499s03()],
// 
// 1 15 0 0 0 1 0 0 0 1 0 0 0 1 s\u9499s04.dat
  [1,15,0,0,0,1,0,0,0,1,0,0,0,1, ldraw_lib__s__u9499s04()],
];
module ldraw_lib__u9499p01(step=0, col=false, unit=2/5, alt=false, line=0.2, solid=!$preview)
    makepoly(ldraw_lib__u9499p01(), step=step, col=col, unit=unit, alt=alt, line=line, solid=solid);
ldraw_lib__u9499p01(line=0.2);
